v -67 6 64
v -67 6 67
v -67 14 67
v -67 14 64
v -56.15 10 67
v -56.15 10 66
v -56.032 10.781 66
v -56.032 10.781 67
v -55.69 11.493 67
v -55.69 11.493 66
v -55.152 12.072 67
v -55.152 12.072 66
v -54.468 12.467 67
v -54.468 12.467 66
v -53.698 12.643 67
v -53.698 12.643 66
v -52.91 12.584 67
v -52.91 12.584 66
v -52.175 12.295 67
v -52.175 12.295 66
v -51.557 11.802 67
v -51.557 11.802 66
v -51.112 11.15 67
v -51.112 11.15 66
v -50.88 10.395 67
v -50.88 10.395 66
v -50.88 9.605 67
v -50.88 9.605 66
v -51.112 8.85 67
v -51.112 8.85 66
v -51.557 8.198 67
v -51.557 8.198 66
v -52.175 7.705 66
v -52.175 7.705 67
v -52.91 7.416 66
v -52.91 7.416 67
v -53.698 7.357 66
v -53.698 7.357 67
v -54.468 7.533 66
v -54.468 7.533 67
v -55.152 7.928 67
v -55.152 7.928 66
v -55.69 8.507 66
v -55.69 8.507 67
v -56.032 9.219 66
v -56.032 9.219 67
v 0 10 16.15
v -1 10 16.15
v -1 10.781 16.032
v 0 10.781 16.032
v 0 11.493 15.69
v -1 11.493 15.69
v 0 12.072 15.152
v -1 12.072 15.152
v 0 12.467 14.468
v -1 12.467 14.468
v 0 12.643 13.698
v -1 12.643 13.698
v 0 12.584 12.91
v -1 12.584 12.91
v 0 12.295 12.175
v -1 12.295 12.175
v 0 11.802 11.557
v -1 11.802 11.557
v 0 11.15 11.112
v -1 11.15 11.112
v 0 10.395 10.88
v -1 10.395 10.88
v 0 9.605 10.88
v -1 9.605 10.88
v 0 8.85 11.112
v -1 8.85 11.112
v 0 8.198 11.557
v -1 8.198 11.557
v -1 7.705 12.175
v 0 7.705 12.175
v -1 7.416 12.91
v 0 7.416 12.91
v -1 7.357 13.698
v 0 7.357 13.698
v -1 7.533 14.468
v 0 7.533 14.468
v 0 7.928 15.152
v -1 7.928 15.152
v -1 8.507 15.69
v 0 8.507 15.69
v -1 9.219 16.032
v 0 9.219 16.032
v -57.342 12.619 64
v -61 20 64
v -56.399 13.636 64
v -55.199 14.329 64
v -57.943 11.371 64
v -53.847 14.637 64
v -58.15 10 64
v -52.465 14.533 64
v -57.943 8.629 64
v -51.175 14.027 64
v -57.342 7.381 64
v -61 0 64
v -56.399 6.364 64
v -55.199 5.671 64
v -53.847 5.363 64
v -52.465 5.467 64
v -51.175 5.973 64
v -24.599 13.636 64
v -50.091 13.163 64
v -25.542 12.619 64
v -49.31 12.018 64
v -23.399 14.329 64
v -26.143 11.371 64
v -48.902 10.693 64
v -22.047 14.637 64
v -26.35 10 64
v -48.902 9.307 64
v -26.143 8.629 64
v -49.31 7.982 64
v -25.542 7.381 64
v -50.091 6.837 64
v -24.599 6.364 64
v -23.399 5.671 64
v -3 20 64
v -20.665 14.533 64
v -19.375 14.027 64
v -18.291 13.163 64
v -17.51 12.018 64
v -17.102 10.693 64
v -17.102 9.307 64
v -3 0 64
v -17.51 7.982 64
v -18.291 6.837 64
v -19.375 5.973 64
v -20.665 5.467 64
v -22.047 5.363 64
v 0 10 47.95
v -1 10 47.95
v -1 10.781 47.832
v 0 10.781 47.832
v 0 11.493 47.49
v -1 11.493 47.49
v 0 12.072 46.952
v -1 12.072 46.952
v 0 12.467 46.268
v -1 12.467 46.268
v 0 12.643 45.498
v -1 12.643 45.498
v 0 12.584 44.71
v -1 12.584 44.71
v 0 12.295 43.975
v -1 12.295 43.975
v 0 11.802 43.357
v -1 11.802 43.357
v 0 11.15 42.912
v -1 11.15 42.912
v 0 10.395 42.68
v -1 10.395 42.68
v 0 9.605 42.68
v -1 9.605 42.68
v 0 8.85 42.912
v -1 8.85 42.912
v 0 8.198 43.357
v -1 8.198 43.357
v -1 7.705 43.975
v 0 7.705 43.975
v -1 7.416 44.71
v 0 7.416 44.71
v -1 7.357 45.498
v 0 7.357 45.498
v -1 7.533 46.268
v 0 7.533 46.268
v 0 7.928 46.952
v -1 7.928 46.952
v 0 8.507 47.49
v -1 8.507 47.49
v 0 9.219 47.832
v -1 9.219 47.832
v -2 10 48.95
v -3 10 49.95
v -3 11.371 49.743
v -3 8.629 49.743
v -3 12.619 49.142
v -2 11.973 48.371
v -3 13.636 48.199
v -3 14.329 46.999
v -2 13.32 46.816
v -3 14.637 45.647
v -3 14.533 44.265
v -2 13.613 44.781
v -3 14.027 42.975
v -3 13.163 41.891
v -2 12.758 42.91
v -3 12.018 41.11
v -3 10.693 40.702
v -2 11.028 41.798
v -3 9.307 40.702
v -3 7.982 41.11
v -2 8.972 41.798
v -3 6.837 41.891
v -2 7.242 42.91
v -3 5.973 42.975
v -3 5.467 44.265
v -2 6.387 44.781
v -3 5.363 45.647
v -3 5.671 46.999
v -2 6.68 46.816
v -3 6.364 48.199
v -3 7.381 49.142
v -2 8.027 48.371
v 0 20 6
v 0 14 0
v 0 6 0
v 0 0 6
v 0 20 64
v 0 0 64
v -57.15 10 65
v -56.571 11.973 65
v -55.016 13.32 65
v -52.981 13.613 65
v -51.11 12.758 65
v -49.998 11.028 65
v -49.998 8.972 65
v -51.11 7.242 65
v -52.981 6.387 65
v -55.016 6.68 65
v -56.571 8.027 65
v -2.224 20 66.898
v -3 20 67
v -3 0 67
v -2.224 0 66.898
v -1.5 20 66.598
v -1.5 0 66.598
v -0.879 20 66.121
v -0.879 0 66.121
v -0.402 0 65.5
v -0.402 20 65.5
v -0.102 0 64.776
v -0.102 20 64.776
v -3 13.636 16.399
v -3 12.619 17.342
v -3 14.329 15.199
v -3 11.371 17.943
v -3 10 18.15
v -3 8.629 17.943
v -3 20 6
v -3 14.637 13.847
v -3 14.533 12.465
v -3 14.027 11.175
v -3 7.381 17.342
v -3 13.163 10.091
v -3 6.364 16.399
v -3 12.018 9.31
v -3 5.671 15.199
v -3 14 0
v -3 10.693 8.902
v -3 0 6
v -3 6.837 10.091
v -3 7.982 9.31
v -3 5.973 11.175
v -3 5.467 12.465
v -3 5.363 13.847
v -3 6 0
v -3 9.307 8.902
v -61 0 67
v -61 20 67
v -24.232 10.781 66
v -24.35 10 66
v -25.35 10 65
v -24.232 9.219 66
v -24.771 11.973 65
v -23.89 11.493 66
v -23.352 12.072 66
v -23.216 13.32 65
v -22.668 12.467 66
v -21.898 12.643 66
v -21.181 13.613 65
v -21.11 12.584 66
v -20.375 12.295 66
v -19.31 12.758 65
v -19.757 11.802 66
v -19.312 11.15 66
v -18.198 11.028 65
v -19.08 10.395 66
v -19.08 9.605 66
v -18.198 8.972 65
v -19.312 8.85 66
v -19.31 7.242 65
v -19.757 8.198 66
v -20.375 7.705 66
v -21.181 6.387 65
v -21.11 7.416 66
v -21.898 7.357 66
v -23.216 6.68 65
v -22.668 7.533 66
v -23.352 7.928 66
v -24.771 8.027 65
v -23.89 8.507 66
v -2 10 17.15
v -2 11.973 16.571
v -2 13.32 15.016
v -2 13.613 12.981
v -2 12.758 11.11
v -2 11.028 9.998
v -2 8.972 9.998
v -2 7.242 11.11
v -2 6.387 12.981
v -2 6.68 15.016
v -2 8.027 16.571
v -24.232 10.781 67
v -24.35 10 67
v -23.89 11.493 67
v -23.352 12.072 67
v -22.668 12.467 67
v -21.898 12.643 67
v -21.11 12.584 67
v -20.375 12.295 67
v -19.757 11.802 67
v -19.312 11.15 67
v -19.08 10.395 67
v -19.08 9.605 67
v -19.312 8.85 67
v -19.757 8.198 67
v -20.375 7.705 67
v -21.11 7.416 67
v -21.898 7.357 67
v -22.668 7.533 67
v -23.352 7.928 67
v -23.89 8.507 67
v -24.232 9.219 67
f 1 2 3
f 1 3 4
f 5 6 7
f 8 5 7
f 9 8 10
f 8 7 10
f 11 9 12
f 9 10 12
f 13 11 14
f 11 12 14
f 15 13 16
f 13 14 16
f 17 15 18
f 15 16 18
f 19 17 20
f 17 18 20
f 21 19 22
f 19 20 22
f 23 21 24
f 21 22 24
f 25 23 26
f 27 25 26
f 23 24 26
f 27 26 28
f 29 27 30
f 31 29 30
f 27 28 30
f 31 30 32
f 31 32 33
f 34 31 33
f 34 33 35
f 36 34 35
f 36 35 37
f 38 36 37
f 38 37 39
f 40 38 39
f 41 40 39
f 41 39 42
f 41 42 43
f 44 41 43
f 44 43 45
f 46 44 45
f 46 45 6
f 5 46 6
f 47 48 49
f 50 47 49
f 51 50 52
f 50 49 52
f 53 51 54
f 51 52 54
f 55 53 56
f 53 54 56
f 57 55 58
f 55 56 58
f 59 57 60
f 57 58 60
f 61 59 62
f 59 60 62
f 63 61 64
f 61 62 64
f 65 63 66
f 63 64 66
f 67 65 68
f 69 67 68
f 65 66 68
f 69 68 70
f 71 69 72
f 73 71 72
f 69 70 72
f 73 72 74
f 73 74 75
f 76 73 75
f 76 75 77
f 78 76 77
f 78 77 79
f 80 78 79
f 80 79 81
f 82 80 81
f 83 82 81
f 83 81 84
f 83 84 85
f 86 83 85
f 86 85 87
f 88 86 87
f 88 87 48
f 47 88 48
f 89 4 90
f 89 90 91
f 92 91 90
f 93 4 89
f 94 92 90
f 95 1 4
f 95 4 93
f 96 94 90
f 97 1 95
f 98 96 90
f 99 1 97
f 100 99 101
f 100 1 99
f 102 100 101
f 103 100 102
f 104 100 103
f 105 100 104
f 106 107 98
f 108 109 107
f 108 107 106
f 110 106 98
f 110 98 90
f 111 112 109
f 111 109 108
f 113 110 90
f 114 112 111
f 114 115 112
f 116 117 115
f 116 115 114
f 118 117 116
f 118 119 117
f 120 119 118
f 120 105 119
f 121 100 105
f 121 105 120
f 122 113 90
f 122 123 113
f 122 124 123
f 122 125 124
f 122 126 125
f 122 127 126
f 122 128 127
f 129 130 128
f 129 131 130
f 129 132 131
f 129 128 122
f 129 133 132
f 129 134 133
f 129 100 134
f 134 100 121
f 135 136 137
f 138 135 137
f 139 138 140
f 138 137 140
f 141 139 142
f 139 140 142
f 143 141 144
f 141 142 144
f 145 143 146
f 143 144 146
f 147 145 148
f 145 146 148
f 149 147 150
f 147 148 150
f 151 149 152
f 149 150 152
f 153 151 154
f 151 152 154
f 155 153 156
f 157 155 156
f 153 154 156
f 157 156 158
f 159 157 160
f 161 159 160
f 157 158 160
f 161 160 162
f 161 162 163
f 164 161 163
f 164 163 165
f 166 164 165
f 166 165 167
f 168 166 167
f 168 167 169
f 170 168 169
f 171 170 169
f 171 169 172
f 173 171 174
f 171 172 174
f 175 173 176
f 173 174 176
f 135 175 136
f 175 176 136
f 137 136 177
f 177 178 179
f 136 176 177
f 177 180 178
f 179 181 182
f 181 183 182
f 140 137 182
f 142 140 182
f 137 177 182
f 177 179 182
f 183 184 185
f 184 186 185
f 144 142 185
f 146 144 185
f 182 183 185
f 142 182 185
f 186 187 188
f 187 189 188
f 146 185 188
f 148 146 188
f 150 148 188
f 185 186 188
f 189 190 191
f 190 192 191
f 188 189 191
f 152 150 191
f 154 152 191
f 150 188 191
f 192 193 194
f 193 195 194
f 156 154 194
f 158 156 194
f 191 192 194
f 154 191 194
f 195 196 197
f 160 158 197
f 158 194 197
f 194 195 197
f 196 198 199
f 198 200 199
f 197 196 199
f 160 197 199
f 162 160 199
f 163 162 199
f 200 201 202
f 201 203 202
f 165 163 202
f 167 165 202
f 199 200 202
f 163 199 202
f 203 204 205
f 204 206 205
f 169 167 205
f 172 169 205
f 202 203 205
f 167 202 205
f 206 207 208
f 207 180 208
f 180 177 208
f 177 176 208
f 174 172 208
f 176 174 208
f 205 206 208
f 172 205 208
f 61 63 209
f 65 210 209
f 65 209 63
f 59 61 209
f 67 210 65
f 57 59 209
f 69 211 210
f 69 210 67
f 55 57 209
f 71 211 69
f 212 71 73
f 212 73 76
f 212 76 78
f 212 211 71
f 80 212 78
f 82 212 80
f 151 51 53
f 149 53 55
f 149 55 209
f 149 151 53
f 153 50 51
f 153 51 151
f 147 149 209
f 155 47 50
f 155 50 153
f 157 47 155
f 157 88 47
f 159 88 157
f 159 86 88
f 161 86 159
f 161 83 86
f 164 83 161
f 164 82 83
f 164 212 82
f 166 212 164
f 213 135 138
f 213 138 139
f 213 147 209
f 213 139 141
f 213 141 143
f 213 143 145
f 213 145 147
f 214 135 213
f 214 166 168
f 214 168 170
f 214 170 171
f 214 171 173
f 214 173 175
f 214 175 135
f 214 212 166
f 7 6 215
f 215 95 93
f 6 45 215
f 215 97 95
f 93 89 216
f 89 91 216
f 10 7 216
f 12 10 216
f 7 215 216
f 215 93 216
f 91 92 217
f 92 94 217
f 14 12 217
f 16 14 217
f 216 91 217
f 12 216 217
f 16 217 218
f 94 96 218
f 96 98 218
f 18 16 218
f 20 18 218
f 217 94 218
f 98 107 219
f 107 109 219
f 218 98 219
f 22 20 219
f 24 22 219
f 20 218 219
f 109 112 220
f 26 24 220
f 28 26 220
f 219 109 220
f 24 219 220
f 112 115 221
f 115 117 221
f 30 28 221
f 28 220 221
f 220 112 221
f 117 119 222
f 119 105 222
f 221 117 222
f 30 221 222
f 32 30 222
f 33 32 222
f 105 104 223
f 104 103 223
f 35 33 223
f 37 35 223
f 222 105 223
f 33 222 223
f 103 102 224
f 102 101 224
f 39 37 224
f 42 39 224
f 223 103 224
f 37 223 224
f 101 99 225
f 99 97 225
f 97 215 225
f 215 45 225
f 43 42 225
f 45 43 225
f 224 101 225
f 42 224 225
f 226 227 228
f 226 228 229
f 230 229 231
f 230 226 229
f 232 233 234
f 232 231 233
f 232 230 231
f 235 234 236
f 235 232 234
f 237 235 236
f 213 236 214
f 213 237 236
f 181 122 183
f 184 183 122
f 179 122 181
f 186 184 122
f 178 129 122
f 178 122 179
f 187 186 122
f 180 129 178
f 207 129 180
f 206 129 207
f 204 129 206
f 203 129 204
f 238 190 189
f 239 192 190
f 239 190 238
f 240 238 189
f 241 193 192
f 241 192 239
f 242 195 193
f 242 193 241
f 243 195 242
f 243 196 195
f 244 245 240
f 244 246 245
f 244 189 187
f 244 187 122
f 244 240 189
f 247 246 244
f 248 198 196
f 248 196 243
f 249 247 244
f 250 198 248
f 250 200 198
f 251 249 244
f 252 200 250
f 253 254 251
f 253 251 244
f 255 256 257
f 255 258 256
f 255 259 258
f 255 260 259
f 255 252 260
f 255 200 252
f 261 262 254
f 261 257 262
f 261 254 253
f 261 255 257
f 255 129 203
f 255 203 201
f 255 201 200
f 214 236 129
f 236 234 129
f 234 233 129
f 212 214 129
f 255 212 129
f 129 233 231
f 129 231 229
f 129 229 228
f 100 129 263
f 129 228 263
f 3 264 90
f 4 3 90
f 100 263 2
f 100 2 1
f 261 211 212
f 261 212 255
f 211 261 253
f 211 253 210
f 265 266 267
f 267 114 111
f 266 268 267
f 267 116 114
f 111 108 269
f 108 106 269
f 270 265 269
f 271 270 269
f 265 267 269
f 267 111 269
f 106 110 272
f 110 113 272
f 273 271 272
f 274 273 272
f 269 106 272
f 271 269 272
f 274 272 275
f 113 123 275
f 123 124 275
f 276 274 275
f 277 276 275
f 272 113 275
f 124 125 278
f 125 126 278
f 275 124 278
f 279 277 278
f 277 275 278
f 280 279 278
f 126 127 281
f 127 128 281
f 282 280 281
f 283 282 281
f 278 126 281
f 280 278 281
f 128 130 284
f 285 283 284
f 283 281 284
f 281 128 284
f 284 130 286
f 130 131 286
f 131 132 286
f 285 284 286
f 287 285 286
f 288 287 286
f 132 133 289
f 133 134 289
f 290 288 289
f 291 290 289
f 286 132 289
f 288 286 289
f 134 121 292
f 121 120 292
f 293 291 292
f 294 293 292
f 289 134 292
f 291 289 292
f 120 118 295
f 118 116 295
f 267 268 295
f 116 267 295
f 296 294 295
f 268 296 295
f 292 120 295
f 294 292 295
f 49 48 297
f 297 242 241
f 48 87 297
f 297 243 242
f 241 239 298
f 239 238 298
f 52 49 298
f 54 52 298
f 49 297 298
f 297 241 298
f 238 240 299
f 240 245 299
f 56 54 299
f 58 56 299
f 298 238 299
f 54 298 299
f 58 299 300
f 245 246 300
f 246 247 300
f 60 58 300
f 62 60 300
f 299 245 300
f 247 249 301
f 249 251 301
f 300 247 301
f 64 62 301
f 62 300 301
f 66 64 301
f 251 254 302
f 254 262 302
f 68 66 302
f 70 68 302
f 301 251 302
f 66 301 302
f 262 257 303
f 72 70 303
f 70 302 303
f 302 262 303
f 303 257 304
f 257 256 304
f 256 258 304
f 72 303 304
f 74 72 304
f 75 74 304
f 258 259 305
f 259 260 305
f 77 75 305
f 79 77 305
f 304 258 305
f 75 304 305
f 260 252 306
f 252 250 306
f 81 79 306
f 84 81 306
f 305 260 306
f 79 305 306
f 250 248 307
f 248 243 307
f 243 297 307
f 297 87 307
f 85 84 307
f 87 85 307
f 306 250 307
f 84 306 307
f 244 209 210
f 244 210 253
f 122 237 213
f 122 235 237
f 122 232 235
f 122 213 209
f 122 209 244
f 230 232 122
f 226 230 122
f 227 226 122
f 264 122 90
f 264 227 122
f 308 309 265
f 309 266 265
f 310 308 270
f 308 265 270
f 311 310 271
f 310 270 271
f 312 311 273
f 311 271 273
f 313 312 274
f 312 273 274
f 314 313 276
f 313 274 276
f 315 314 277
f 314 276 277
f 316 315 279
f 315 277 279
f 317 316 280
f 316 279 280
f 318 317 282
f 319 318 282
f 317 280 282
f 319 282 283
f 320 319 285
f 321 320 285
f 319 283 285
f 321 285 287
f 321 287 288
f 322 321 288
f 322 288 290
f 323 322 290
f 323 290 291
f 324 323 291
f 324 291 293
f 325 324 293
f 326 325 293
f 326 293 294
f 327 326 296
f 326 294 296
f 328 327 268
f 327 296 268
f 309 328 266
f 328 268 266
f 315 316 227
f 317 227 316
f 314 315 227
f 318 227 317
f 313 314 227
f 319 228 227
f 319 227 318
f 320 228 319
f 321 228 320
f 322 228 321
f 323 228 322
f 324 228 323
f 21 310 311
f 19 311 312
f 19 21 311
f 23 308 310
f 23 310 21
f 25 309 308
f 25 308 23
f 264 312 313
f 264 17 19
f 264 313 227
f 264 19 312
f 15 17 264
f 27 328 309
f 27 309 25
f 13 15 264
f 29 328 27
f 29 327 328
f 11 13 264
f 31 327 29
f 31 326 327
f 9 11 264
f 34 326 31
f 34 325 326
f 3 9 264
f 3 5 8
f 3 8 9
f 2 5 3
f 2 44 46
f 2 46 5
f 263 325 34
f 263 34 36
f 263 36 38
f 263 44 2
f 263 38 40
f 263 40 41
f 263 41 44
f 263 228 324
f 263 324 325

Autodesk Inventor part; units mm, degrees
ref_plane "YZ Plane" through (0, 0, 0) normal (1, 0, 0) x (0, 1, 0)
ref_plane "XZ Plane" through (0, 0, 0) normal (0, 1, 0) x (-1, 0, 0)
ref_plane "XY Plane" through (0, 0, 0) normal (0, 0, 1) x (1, 0, 0)
sketch "Sketch1" plane through (0, 0, 0) normal (0, 1, 0) x (-1, 0, 0)
  line L0 (0, 0) -> (0, 67)
  line L1 (0, 67) -> (67, 67)
  line L2 (67, 64) -> (3, 64)
  line L3 (3, 64) -> (3, 0)
  line L4 (67, 67) -> (67, 64)
  line L5 (3, 0) -> (0, 0)
  dimension "d0" = 67
  dimension "d1" = 67
  dimension "d2" = 3
extrude "Extrusion1" add sketch "Sketch1" along normal blind 20
sketch "Sketch2" plane through (-3, 0, 64) normal (0, 0, -1) x (-1, 0, 0)
  line L0 (64, 0) -> (64, 20) construction
  line L1 (64, 10) -> (0, 10) construction
  line L2 (0, 0) -> (0, 20) construction
  circle A0 centre (50.5, 10) radius 2.65
  circle A1 centre (18.7, 10) radius 2.65
  point P0 (-3, 0)
  dimension "d5" = 5.3
  dimension "d6" = 5.3
  dimension "d7" = 13.5
  dimension "d8" = 31.8
extrude "Extrusion2" cut sketch "Sketch2" against normal up to next
sketch "Sketch3" plane through (-3, 0, 0) normal (-1, 0, 0) x (0, 0, 1)
  line L0 (0, 0) -> (0, 20) construction
  line L1 (0, 10) -> (64, 10) construction
  line L2 (64, 0) -> (64, 20) construction
  circle A0 centre (13.5, 10) radius 2.65
  circle A1 centre (45.3, 10) radius 2.65
  dimension "d11" = 5.3
  dimension "d12" = 5.3
  dimension "d13" = 13.5
  dimension "d14" = 31.8
extrude "Extrusion3" cut sketch "Sketch3" against normal up to next
chamfer "Chamfer1" distance 2 angle 45 4 edges at (-50.85, 10, 64) (-19.05, 10, 64) (-3, 10, 42.65) (-3, 10, 10.85)
chamfer "Chamfer2" distance 6 angle 45 4 edges at (-67, 0, 65.5) (-67, 20, 65.5) (-1.5, 0, 0) (-1.5, 20, 0)
fillet "Fillet1" radius 3 1 edges at (0, 10, 67)
equation "\"d1\" = d0"
equation "\"d6\" = d5"
equation "\"d12\" = d11"
properties part number "90 deg Shelf 4 Hole Bracket"
